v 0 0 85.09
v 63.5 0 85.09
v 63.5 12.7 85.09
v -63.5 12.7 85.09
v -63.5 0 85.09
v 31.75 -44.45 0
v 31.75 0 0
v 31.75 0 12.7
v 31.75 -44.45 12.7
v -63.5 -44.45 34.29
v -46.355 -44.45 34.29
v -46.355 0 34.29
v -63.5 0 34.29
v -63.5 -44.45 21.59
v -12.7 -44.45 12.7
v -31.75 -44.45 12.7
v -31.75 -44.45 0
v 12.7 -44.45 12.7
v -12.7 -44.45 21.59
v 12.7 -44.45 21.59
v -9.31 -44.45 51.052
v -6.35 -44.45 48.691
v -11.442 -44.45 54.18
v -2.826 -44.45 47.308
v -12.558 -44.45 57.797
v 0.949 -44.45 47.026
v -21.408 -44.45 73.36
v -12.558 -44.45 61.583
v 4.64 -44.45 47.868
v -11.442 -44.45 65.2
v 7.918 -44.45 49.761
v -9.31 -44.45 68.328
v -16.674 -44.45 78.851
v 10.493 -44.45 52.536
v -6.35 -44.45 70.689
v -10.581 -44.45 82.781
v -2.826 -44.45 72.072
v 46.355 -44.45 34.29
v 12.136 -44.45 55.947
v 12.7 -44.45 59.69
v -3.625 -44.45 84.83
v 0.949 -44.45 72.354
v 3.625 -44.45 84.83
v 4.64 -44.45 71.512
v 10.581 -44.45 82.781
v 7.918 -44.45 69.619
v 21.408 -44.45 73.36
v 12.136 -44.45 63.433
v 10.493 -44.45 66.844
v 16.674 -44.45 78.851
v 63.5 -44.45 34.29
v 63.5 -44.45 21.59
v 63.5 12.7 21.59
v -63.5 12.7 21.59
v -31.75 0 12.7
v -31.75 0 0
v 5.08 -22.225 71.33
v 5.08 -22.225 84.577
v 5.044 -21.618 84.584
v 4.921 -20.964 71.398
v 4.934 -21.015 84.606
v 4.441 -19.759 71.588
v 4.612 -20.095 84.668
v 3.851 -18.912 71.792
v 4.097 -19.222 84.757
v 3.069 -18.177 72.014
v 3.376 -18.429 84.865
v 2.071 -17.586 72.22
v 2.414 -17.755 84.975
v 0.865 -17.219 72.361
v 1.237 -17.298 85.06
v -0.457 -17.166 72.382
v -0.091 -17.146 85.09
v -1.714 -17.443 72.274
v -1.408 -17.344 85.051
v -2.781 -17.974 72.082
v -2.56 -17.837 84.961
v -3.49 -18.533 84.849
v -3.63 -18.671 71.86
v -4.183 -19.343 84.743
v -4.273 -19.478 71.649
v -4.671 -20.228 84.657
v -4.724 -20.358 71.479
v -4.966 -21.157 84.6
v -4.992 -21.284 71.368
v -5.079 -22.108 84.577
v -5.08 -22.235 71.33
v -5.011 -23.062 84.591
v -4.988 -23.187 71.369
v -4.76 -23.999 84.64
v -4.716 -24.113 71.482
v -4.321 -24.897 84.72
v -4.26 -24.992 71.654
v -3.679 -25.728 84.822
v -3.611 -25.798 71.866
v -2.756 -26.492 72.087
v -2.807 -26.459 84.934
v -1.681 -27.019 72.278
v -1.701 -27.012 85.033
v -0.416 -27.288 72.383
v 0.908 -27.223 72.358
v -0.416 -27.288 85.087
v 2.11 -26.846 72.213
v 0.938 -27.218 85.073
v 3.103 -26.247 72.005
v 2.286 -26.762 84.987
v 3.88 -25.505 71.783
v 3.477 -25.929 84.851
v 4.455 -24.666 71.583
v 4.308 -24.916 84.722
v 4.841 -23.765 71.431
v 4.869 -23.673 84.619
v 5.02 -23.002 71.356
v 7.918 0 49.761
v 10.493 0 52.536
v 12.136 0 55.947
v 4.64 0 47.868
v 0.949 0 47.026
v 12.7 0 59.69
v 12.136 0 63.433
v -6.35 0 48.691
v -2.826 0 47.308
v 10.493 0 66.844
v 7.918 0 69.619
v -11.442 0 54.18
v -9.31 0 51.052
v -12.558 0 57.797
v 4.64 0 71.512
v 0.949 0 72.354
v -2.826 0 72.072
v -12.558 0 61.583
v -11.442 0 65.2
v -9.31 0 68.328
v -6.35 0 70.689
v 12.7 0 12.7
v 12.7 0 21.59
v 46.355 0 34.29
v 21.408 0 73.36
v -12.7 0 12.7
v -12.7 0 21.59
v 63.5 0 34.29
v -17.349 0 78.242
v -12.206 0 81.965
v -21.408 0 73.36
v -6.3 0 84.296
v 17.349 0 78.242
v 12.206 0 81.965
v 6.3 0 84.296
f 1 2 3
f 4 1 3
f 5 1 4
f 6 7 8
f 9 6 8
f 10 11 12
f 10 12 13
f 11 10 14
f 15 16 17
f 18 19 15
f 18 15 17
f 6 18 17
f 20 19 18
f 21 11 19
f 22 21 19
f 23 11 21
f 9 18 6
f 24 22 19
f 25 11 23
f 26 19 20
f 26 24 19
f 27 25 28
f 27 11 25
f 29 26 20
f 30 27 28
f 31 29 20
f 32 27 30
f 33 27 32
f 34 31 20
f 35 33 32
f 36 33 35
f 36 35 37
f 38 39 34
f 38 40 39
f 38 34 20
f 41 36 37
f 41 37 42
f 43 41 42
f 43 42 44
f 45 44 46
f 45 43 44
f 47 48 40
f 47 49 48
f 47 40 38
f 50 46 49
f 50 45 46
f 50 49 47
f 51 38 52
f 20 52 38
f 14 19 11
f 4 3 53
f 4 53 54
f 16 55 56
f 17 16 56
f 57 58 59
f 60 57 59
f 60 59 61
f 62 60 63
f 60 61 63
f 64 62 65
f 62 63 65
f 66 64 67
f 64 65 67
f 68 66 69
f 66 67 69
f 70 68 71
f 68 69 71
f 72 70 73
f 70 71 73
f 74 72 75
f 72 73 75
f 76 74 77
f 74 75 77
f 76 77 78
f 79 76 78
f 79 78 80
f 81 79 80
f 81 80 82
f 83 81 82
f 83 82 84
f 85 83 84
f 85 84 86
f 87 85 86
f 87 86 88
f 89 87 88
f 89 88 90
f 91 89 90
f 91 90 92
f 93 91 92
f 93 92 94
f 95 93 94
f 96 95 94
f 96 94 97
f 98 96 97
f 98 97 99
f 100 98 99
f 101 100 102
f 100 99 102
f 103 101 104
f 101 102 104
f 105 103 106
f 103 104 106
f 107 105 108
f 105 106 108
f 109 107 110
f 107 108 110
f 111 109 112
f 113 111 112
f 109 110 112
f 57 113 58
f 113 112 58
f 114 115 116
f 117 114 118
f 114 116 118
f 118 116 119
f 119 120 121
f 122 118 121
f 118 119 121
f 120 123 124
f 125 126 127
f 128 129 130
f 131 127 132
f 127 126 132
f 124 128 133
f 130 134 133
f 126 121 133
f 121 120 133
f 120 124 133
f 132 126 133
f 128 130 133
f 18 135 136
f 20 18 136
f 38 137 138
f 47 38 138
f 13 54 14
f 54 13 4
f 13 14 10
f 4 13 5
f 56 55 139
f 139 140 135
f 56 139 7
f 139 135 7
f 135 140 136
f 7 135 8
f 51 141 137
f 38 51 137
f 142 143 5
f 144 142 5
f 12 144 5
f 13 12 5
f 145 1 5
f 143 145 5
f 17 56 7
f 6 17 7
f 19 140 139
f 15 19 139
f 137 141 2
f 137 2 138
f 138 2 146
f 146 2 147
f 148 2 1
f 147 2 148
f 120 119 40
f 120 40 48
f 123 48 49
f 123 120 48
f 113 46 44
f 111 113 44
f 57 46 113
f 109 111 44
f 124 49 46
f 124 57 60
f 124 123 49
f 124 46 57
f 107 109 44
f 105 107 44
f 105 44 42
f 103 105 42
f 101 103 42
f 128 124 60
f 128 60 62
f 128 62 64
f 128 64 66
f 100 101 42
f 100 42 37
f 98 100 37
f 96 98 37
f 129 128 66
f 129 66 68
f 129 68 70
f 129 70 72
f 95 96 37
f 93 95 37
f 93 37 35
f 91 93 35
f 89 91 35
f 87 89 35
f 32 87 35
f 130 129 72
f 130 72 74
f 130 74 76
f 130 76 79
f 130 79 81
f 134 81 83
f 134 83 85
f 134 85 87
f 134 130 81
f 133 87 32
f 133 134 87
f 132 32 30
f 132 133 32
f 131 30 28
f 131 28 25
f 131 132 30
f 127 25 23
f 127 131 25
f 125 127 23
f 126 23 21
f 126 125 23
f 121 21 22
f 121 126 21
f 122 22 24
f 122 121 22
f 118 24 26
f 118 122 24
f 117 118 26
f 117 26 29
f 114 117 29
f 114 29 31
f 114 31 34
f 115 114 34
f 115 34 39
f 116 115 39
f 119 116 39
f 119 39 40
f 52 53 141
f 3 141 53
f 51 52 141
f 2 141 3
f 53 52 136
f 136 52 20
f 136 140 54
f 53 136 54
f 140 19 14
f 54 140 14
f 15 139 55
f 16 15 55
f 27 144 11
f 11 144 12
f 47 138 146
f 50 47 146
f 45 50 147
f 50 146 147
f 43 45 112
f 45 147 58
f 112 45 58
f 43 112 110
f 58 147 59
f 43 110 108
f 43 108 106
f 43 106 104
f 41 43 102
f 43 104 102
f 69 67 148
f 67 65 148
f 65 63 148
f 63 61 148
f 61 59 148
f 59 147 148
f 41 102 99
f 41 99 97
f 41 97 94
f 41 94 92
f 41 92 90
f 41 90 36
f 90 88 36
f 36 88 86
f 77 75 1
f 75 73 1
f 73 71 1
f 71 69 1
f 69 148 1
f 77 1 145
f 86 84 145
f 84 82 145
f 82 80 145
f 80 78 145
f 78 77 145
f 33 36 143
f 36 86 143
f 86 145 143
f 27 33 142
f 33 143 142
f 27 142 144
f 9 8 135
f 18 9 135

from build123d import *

# Parameters (mm, degrees)
F0_R     = 12.7
F1_DEPTH = 44.45
F2_W     = 127
F2_H     = 63.5
F3_DEPTH = 12.7
F5_R     = 5.08
F6_DEPTH = 25.4


with BuildPart() as f1:
    # F0 (on Front) → F1 (new body)
    with BuildSketch(Plane.XZ):
        with BuildLine():
            Line((-31.75, 0), (0, 0))
            Line((0, 0), (31.75, 0))
            Line((31.75, 0), (31.75, 12.7))
            Line((31.75, 12.7), (12.7, 12.7))
            Line((12.7, 12.7), (12.7, 21.59))
            Line((12.7, 21.59), (63.5, 21.59))
            Line((63.5, 21.59), (63.5, 34.29))
            Line((63.5, 34.29), (46.355, 34.29))
            Line((46.355, 34.29), (21.407995, 73.359592))
            ThreePointArc((21.407995, 73.359592), (0, 85.09), (-21.407995, 73.359592))
            Line((-21.407995, 73.359592), (-46.355, 34.29))
            Line((-46.355, 34.29), (-63.5, 34.29))
            Line((-63.5, 34.29), (-63.5, 21.59))
            Line((-63.5, 21.59), (-12.7, 21.59))
            Line((-12.7, 21.59), (-12.7, 12.7))
            Line((-12.7, 12.7), (-31.75, 12.7))
            Line((-31.75, 12.7), (-31.75, 0))
        make_face()
        with Locations((0, 59.69)):
            Circle(F0_R, mode=Mode.SUBTRACT)
    extrude(amount=F1_DEPTH)

    # F2 (on face) → F3 (join)
    with BuildSketch(Plane(origin=(0, 0, 0), x_dir=(-1, 0, 0), z_dir=(0, 1, 0))):
        with Locations((0, 53.34)):
            Rectangle(F2_W, F2_H)
    extrude(amount=F3_DEPTH)

    # F5 (on offset) → F6 (cut)
    with BuildSketch(Plane.XY.offset(85.09)):
        with Locations((0, -22.225)):
            Circle(F5_R)
    extrude(amount=-F6_DEPTH, mode=Mode.SUBTRACT)


solid = f1.part
